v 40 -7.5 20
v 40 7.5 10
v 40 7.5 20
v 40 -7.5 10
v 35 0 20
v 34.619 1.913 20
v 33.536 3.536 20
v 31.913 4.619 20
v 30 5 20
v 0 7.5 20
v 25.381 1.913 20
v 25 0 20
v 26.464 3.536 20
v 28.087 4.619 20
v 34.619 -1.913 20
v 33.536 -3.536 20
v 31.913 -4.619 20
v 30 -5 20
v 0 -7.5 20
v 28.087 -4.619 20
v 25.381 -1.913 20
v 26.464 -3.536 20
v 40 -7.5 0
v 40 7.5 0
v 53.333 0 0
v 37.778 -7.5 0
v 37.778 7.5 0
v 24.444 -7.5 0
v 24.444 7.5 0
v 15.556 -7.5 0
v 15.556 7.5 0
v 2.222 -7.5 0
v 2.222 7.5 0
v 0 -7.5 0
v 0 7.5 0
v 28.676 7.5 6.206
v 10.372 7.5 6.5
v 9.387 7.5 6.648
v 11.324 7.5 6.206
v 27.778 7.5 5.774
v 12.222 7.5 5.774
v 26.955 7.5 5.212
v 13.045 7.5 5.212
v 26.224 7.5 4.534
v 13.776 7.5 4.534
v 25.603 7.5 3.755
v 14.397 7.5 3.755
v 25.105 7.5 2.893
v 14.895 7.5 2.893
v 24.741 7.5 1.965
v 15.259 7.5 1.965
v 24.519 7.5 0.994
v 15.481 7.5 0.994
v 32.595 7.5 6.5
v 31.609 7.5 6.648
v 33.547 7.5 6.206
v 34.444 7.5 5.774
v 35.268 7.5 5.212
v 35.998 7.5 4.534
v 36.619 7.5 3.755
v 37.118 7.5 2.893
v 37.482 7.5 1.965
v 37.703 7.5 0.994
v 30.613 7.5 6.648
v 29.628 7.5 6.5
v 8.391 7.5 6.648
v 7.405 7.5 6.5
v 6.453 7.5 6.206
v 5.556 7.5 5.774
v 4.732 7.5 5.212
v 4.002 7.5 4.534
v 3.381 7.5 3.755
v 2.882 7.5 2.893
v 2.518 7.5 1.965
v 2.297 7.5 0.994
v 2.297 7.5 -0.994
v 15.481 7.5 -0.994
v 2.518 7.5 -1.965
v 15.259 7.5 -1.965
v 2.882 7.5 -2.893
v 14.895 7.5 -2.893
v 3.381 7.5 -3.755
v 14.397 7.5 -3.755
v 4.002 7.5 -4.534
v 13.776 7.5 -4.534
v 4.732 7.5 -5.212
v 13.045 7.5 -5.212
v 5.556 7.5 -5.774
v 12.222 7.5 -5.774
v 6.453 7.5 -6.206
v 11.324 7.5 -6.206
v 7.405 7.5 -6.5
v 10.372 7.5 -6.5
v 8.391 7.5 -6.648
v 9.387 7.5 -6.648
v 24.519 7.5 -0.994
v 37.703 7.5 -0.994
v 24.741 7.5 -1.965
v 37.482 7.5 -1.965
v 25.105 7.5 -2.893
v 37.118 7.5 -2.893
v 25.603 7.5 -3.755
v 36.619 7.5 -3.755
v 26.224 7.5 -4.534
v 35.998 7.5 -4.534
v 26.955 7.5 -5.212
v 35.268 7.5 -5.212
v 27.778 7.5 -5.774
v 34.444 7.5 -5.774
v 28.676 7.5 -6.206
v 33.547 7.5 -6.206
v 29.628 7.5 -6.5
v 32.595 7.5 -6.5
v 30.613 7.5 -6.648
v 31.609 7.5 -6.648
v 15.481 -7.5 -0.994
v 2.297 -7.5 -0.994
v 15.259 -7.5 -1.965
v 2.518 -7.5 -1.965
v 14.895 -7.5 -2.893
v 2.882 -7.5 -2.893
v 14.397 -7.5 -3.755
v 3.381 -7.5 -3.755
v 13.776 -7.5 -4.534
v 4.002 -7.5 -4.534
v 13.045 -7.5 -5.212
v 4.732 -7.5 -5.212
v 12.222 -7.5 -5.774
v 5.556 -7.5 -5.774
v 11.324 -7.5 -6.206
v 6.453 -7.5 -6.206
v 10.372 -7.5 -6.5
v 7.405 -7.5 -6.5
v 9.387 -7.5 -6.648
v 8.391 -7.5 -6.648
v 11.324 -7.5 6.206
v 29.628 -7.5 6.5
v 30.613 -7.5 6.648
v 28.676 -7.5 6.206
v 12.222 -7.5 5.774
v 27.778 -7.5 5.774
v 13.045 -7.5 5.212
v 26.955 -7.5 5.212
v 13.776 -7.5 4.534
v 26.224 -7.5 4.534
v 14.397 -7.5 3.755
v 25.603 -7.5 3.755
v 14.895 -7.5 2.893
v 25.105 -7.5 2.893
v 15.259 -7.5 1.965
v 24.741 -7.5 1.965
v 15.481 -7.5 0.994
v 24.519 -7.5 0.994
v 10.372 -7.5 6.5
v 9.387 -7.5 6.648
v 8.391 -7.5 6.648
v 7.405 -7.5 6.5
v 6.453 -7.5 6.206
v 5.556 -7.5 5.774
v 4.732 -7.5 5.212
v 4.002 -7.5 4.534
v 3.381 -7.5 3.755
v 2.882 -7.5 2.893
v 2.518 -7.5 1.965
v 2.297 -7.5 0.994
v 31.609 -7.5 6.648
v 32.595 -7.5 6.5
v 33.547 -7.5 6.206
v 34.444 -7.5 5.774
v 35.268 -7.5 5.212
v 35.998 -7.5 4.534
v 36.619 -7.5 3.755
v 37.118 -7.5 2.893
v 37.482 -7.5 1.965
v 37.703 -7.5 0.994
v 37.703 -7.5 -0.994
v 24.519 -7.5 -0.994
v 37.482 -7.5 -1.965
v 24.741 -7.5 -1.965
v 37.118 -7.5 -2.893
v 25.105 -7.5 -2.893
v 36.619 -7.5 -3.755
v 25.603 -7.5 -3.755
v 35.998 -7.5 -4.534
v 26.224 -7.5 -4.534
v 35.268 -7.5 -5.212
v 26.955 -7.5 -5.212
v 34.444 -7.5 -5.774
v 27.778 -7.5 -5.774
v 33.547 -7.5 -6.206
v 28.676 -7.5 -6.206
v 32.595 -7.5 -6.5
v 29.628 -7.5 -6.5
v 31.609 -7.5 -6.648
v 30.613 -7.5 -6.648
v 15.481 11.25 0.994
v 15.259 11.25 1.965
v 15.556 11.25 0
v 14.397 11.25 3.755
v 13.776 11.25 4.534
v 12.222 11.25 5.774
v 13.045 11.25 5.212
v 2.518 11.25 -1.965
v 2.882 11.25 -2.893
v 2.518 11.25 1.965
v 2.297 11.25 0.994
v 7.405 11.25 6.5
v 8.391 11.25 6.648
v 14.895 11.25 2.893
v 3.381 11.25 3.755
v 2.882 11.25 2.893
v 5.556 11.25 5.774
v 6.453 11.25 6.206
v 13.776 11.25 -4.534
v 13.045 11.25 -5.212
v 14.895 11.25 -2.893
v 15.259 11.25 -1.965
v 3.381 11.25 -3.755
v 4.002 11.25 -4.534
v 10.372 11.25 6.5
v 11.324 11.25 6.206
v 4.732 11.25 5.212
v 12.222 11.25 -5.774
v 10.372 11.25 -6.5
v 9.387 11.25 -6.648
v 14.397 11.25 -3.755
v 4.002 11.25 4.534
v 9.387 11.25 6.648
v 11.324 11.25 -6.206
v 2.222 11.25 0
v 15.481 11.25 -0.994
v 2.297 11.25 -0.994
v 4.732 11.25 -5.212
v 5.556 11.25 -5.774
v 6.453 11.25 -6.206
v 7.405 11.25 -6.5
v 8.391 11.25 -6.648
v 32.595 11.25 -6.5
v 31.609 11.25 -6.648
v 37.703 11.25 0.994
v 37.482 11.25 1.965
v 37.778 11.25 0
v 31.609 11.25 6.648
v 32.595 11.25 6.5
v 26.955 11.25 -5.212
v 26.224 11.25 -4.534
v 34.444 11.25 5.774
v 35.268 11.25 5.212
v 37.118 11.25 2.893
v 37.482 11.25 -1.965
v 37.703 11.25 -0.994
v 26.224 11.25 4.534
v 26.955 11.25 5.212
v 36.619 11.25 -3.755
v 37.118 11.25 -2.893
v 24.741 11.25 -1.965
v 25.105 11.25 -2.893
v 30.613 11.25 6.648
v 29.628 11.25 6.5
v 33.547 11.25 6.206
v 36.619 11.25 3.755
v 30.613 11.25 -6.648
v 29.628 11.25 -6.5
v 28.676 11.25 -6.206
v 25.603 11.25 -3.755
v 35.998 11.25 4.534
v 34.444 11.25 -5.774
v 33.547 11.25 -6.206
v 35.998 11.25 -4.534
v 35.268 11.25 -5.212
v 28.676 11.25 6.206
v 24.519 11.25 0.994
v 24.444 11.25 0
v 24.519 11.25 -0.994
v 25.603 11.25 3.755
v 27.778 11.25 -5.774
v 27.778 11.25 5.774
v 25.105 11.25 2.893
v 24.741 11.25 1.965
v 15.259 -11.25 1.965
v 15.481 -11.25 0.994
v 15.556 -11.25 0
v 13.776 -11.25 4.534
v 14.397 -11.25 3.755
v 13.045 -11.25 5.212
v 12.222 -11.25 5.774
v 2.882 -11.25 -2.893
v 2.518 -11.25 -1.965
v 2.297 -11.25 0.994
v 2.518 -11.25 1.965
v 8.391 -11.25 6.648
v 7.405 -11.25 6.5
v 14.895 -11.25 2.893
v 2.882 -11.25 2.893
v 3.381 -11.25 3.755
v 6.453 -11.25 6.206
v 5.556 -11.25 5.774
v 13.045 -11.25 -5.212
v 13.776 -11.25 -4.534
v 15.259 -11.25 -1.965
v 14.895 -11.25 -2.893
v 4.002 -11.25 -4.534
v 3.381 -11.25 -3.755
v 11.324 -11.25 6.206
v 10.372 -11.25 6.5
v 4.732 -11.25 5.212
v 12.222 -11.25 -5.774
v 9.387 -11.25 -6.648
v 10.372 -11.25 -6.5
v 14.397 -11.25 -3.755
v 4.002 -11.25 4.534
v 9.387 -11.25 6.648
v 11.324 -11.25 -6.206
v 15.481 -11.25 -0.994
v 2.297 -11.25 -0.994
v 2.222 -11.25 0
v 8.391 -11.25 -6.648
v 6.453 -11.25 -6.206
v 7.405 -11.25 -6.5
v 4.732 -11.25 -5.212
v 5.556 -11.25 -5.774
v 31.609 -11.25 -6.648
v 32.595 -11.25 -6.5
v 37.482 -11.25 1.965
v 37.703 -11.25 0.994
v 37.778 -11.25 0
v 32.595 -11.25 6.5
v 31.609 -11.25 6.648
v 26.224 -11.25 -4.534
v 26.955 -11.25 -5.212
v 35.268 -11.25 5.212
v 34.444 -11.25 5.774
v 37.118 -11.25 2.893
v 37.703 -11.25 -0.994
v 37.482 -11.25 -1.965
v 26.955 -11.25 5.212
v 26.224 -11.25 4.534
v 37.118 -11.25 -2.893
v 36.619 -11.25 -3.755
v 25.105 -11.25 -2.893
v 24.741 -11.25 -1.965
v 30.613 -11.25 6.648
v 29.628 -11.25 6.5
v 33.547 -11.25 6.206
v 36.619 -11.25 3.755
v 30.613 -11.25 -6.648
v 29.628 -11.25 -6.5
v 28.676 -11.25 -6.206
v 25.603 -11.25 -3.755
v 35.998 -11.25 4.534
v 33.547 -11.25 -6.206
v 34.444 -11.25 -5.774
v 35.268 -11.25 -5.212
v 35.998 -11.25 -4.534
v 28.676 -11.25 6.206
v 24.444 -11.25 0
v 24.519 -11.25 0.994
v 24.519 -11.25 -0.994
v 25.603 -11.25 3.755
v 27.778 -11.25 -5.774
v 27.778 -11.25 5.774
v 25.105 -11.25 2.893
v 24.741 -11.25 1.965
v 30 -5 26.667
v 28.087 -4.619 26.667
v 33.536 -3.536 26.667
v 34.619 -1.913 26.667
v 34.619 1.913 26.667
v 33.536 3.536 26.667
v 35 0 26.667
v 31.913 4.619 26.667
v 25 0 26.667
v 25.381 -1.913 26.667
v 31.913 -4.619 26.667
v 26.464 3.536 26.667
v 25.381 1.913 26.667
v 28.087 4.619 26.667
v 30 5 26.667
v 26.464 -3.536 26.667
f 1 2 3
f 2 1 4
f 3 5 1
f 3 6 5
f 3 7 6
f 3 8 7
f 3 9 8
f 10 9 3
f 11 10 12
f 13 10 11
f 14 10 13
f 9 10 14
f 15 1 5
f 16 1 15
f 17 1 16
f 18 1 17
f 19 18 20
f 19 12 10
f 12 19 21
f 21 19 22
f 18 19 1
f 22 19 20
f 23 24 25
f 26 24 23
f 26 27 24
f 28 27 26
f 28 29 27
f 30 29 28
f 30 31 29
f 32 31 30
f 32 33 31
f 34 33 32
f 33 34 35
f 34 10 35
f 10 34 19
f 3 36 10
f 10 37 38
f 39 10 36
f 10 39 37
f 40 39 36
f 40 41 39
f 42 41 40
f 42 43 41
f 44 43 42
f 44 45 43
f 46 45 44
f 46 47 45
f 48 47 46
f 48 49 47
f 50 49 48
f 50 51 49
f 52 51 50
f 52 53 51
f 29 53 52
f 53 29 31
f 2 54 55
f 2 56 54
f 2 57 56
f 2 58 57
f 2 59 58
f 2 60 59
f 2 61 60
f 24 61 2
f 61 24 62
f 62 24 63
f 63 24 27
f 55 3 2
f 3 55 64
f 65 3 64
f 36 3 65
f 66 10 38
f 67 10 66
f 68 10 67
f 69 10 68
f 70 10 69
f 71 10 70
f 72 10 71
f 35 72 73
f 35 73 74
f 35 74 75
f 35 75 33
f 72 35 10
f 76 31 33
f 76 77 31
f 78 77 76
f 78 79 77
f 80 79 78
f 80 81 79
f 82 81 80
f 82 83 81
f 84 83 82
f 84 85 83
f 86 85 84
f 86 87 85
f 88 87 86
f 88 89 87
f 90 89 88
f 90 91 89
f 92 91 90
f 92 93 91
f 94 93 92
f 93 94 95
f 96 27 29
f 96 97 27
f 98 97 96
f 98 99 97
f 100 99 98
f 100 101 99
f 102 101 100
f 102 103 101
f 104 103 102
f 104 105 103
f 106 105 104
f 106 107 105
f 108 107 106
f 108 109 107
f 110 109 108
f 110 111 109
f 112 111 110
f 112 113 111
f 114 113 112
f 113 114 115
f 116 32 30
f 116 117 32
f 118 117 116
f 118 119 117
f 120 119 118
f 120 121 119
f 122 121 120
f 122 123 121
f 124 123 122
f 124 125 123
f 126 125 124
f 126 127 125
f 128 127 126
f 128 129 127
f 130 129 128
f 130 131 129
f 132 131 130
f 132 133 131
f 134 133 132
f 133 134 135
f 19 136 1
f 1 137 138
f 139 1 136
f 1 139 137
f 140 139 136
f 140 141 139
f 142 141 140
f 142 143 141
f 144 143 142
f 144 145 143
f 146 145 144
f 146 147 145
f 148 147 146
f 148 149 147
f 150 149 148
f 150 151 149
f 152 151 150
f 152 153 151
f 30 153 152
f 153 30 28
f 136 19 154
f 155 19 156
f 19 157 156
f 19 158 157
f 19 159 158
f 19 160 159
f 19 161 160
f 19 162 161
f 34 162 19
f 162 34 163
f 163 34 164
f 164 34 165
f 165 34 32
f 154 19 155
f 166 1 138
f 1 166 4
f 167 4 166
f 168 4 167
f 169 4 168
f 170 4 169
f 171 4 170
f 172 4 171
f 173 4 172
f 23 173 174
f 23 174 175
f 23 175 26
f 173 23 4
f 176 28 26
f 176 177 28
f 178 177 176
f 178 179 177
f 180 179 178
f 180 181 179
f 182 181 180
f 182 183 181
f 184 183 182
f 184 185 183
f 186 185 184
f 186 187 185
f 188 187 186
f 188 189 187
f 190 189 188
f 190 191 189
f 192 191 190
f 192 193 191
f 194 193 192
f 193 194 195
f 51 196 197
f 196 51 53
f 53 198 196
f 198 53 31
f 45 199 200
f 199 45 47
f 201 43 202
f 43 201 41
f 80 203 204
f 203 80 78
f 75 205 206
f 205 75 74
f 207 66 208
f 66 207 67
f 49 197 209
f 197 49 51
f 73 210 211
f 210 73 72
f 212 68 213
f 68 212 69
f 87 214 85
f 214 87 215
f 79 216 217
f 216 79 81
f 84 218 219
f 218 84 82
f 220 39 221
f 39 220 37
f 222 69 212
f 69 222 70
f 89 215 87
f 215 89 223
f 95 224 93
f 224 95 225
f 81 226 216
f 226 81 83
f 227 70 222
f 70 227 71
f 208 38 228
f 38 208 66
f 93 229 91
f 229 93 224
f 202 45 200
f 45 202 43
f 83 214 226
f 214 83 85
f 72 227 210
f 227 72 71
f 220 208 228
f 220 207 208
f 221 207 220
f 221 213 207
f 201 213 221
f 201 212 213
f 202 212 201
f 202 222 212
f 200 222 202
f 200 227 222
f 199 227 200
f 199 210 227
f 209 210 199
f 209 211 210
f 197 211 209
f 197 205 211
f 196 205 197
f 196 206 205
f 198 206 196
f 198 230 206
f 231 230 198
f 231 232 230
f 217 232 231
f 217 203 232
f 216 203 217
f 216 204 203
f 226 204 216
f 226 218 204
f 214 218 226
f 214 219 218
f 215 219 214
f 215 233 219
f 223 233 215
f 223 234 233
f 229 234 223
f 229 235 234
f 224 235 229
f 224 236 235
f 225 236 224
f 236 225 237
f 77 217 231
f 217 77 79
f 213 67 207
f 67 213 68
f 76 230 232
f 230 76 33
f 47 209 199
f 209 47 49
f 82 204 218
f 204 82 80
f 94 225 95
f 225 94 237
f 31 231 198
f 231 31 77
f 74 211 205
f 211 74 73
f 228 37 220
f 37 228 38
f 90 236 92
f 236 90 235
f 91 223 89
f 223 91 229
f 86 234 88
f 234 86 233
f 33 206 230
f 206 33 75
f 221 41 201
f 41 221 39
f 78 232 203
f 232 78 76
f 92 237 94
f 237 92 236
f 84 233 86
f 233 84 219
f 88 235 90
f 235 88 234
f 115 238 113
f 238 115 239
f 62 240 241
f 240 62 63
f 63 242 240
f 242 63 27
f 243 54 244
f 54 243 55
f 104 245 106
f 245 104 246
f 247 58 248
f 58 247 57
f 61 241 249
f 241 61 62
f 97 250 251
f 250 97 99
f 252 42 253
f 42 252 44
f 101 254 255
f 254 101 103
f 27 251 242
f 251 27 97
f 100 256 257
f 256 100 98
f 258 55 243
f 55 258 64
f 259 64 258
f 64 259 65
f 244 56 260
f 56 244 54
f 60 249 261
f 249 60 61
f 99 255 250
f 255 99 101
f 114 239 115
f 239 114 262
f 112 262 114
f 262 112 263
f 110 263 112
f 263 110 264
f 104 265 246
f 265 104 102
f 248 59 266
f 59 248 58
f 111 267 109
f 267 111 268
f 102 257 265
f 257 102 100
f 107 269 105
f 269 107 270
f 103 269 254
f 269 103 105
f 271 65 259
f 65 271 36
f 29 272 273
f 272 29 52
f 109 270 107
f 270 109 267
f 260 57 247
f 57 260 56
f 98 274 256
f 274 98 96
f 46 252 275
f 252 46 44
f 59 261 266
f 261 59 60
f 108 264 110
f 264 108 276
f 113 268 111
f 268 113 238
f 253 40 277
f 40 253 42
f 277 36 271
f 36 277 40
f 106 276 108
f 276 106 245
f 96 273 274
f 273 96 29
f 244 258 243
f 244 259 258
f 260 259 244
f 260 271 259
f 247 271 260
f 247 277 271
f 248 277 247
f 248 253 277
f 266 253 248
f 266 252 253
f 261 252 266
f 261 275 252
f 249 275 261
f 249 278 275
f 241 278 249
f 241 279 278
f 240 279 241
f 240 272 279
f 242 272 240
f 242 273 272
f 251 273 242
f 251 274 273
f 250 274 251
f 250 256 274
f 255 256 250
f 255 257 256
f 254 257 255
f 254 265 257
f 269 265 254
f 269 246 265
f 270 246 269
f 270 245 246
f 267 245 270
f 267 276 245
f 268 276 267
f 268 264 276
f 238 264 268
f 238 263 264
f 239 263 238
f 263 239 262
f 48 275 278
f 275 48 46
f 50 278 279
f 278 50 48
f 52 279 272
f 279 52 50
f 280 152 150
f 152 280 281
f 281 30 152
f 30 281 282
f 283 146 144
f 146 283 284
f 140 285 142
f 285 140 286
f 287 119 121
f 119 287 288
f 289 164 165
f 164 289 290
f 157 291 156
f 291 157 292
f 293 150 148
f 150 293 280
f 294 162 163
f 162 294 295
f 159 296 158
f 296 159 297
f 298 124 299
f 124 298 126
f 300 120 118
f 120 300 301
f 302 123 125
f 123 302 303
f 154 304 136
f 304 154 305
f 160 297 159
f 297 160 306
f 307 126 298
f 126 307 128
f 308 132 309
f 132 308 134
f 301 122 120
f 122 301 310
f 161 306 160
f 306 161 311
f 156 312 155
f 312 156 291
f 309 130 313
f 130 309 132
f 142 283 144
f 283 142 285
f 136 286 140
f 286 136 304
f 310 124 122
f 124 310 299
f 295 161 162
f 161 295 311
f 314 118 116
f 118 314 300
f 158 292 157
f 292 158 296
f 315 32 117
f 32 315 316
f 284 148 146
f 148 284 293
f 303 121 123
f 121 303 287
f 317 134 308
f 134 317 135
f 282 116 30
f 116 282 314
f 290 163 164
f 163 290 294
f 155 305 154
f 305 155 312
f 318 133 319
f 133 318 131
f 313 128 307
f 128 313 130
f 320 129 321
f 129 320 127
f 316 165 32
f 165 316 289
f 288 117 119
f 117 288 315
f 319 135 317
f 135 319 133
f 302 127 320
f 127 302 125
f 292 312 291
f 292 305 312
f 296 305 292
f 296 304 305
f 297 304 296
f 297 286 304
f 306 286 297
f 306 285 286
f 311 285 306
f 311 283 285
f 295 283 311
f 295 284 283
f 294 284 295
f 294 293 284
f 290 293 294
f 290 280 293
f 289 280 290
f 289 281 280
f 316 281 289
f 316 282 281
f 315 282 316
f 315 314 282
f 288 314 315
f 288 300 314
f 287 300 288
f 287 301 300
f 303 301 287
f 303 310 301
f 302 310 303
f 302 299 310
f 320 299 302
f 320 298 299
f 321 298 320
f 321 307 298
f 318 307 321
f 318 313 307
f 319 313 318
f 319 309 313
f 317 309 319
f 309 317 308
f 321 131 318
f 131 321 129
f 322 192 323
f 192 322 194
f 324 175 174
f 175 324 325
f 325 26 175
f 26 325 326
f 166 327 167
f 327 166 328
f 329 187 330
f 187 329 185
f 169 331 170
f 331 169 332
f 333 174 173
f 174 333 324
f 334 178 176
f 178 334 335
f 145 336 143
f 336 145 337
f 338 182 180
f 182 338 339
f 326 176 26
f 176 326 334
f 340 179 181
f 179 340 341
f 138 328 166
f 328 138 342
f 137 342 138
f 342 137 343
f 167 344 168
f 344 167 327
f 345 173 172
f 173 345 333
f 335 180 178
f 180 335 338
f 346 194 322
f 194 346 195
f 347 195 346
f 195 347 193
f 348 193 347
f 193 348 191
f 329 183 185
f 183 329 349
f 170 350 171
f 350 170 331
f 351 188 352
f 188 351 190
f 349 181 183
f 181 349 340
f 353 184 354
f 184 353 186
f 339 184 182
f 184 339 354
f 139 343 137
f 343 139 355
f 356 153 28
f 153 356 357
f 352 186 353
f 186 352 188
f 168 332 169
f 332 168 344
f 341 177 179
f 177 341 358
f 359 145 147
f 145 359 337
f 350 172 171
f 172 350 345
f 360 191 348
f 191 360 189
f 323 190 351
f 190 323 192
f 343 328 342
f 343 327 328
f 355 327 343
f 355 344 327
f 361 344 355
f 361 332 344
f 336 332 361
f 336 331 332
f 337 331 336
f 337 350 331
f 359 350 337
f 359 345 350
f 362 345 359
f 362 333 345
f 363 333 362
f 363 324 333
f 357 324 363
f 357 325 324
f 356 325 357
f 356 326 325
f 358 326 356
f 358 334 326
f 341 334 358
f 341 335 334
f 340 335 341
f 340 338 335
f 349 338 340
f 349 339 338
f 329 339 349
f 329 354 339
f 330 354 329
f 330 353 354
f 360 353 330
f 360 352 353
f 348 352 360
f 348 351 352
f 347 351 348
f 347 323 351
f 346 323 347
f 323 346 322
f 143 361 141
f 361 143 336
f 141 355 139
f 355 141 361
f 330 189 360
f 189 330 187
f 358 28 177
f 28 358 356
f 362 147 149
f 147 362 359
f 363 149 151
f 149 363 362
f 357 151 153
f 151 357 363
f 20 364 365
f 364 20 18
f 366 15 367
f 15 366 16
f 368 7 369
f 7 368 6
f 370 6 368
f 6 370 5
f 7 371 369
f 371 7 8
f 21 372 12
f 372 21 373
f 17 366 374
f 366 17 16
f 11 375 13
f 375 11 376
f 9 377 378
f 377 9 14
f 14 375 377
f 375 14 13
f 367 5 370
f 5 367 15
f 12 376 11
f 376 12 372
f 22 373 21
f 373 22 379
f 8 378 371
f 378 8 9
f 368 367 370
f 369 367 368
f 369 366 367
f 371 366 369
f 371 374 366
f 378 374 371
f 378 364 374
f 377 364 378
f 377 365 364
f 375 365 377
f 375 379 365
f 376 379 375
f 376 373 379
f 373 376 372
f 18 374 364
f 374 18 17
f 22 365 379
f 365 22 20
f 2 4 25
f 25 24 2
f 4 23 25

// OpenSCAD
module choochoo(width, length, height) {

    // main cube
    translate([0, -width/2, 0])
    cube([length, width, height]);

    // wheels
    wheel_radius = height/3;
    wheel_width = width/4;
    wheel_buffer = 4/3;
    translate([wheel_radius*wheel_buffer, width-wheel_width, 0])
        rotate(a=[90, 0, 0])
            cylinder(h=wheel_width, r=wheel_radius, $fa=1, $fs=1);
    translate([length-wheel_radius*wheel_buffer, width-wheel_width, 0])
        rotate(a=[90, 0, 0])
            cylinder(h=wheel_width, r=wheel_radius, $fa=1, $fs=1);
    translate([wheel_radius*wheel_buffer, -width/2, 0])
        rotate(a=[90, 0, 0])
            cylinder(h=wheel_width, r=wheel_radius, $fa=1, $fs=1);
    translate([length-wheel_radius*wheel_buffer, -width/2, 0])
        rotate(a=[90, 0, 0])
            cylinder(h=wheel_width, r=wheel_radius, $fa=1, $fs=1);

    // smoke stack
    smoke_stack_radius = length/8;
    translate([length - 2*smoke_stack_radius, 0, height])
        cylinder(h=height/3, r=smoke_stack_radius);

    // cattle catcher
    polyhedron(
        points=[[length, width/2, 0],
                [length, -width/2, 0],
                [length, width/2, height/2],
                [length, -width/2, height/2],
                [length+length/3, 0, 0]],
        triangles=[[0,1,4], [0,4,2], [1,3,4], [2,4,3], [3, 1,0,], [2, 3, 0] ]);

}

choochoo(length=40, width=15, height=20);
